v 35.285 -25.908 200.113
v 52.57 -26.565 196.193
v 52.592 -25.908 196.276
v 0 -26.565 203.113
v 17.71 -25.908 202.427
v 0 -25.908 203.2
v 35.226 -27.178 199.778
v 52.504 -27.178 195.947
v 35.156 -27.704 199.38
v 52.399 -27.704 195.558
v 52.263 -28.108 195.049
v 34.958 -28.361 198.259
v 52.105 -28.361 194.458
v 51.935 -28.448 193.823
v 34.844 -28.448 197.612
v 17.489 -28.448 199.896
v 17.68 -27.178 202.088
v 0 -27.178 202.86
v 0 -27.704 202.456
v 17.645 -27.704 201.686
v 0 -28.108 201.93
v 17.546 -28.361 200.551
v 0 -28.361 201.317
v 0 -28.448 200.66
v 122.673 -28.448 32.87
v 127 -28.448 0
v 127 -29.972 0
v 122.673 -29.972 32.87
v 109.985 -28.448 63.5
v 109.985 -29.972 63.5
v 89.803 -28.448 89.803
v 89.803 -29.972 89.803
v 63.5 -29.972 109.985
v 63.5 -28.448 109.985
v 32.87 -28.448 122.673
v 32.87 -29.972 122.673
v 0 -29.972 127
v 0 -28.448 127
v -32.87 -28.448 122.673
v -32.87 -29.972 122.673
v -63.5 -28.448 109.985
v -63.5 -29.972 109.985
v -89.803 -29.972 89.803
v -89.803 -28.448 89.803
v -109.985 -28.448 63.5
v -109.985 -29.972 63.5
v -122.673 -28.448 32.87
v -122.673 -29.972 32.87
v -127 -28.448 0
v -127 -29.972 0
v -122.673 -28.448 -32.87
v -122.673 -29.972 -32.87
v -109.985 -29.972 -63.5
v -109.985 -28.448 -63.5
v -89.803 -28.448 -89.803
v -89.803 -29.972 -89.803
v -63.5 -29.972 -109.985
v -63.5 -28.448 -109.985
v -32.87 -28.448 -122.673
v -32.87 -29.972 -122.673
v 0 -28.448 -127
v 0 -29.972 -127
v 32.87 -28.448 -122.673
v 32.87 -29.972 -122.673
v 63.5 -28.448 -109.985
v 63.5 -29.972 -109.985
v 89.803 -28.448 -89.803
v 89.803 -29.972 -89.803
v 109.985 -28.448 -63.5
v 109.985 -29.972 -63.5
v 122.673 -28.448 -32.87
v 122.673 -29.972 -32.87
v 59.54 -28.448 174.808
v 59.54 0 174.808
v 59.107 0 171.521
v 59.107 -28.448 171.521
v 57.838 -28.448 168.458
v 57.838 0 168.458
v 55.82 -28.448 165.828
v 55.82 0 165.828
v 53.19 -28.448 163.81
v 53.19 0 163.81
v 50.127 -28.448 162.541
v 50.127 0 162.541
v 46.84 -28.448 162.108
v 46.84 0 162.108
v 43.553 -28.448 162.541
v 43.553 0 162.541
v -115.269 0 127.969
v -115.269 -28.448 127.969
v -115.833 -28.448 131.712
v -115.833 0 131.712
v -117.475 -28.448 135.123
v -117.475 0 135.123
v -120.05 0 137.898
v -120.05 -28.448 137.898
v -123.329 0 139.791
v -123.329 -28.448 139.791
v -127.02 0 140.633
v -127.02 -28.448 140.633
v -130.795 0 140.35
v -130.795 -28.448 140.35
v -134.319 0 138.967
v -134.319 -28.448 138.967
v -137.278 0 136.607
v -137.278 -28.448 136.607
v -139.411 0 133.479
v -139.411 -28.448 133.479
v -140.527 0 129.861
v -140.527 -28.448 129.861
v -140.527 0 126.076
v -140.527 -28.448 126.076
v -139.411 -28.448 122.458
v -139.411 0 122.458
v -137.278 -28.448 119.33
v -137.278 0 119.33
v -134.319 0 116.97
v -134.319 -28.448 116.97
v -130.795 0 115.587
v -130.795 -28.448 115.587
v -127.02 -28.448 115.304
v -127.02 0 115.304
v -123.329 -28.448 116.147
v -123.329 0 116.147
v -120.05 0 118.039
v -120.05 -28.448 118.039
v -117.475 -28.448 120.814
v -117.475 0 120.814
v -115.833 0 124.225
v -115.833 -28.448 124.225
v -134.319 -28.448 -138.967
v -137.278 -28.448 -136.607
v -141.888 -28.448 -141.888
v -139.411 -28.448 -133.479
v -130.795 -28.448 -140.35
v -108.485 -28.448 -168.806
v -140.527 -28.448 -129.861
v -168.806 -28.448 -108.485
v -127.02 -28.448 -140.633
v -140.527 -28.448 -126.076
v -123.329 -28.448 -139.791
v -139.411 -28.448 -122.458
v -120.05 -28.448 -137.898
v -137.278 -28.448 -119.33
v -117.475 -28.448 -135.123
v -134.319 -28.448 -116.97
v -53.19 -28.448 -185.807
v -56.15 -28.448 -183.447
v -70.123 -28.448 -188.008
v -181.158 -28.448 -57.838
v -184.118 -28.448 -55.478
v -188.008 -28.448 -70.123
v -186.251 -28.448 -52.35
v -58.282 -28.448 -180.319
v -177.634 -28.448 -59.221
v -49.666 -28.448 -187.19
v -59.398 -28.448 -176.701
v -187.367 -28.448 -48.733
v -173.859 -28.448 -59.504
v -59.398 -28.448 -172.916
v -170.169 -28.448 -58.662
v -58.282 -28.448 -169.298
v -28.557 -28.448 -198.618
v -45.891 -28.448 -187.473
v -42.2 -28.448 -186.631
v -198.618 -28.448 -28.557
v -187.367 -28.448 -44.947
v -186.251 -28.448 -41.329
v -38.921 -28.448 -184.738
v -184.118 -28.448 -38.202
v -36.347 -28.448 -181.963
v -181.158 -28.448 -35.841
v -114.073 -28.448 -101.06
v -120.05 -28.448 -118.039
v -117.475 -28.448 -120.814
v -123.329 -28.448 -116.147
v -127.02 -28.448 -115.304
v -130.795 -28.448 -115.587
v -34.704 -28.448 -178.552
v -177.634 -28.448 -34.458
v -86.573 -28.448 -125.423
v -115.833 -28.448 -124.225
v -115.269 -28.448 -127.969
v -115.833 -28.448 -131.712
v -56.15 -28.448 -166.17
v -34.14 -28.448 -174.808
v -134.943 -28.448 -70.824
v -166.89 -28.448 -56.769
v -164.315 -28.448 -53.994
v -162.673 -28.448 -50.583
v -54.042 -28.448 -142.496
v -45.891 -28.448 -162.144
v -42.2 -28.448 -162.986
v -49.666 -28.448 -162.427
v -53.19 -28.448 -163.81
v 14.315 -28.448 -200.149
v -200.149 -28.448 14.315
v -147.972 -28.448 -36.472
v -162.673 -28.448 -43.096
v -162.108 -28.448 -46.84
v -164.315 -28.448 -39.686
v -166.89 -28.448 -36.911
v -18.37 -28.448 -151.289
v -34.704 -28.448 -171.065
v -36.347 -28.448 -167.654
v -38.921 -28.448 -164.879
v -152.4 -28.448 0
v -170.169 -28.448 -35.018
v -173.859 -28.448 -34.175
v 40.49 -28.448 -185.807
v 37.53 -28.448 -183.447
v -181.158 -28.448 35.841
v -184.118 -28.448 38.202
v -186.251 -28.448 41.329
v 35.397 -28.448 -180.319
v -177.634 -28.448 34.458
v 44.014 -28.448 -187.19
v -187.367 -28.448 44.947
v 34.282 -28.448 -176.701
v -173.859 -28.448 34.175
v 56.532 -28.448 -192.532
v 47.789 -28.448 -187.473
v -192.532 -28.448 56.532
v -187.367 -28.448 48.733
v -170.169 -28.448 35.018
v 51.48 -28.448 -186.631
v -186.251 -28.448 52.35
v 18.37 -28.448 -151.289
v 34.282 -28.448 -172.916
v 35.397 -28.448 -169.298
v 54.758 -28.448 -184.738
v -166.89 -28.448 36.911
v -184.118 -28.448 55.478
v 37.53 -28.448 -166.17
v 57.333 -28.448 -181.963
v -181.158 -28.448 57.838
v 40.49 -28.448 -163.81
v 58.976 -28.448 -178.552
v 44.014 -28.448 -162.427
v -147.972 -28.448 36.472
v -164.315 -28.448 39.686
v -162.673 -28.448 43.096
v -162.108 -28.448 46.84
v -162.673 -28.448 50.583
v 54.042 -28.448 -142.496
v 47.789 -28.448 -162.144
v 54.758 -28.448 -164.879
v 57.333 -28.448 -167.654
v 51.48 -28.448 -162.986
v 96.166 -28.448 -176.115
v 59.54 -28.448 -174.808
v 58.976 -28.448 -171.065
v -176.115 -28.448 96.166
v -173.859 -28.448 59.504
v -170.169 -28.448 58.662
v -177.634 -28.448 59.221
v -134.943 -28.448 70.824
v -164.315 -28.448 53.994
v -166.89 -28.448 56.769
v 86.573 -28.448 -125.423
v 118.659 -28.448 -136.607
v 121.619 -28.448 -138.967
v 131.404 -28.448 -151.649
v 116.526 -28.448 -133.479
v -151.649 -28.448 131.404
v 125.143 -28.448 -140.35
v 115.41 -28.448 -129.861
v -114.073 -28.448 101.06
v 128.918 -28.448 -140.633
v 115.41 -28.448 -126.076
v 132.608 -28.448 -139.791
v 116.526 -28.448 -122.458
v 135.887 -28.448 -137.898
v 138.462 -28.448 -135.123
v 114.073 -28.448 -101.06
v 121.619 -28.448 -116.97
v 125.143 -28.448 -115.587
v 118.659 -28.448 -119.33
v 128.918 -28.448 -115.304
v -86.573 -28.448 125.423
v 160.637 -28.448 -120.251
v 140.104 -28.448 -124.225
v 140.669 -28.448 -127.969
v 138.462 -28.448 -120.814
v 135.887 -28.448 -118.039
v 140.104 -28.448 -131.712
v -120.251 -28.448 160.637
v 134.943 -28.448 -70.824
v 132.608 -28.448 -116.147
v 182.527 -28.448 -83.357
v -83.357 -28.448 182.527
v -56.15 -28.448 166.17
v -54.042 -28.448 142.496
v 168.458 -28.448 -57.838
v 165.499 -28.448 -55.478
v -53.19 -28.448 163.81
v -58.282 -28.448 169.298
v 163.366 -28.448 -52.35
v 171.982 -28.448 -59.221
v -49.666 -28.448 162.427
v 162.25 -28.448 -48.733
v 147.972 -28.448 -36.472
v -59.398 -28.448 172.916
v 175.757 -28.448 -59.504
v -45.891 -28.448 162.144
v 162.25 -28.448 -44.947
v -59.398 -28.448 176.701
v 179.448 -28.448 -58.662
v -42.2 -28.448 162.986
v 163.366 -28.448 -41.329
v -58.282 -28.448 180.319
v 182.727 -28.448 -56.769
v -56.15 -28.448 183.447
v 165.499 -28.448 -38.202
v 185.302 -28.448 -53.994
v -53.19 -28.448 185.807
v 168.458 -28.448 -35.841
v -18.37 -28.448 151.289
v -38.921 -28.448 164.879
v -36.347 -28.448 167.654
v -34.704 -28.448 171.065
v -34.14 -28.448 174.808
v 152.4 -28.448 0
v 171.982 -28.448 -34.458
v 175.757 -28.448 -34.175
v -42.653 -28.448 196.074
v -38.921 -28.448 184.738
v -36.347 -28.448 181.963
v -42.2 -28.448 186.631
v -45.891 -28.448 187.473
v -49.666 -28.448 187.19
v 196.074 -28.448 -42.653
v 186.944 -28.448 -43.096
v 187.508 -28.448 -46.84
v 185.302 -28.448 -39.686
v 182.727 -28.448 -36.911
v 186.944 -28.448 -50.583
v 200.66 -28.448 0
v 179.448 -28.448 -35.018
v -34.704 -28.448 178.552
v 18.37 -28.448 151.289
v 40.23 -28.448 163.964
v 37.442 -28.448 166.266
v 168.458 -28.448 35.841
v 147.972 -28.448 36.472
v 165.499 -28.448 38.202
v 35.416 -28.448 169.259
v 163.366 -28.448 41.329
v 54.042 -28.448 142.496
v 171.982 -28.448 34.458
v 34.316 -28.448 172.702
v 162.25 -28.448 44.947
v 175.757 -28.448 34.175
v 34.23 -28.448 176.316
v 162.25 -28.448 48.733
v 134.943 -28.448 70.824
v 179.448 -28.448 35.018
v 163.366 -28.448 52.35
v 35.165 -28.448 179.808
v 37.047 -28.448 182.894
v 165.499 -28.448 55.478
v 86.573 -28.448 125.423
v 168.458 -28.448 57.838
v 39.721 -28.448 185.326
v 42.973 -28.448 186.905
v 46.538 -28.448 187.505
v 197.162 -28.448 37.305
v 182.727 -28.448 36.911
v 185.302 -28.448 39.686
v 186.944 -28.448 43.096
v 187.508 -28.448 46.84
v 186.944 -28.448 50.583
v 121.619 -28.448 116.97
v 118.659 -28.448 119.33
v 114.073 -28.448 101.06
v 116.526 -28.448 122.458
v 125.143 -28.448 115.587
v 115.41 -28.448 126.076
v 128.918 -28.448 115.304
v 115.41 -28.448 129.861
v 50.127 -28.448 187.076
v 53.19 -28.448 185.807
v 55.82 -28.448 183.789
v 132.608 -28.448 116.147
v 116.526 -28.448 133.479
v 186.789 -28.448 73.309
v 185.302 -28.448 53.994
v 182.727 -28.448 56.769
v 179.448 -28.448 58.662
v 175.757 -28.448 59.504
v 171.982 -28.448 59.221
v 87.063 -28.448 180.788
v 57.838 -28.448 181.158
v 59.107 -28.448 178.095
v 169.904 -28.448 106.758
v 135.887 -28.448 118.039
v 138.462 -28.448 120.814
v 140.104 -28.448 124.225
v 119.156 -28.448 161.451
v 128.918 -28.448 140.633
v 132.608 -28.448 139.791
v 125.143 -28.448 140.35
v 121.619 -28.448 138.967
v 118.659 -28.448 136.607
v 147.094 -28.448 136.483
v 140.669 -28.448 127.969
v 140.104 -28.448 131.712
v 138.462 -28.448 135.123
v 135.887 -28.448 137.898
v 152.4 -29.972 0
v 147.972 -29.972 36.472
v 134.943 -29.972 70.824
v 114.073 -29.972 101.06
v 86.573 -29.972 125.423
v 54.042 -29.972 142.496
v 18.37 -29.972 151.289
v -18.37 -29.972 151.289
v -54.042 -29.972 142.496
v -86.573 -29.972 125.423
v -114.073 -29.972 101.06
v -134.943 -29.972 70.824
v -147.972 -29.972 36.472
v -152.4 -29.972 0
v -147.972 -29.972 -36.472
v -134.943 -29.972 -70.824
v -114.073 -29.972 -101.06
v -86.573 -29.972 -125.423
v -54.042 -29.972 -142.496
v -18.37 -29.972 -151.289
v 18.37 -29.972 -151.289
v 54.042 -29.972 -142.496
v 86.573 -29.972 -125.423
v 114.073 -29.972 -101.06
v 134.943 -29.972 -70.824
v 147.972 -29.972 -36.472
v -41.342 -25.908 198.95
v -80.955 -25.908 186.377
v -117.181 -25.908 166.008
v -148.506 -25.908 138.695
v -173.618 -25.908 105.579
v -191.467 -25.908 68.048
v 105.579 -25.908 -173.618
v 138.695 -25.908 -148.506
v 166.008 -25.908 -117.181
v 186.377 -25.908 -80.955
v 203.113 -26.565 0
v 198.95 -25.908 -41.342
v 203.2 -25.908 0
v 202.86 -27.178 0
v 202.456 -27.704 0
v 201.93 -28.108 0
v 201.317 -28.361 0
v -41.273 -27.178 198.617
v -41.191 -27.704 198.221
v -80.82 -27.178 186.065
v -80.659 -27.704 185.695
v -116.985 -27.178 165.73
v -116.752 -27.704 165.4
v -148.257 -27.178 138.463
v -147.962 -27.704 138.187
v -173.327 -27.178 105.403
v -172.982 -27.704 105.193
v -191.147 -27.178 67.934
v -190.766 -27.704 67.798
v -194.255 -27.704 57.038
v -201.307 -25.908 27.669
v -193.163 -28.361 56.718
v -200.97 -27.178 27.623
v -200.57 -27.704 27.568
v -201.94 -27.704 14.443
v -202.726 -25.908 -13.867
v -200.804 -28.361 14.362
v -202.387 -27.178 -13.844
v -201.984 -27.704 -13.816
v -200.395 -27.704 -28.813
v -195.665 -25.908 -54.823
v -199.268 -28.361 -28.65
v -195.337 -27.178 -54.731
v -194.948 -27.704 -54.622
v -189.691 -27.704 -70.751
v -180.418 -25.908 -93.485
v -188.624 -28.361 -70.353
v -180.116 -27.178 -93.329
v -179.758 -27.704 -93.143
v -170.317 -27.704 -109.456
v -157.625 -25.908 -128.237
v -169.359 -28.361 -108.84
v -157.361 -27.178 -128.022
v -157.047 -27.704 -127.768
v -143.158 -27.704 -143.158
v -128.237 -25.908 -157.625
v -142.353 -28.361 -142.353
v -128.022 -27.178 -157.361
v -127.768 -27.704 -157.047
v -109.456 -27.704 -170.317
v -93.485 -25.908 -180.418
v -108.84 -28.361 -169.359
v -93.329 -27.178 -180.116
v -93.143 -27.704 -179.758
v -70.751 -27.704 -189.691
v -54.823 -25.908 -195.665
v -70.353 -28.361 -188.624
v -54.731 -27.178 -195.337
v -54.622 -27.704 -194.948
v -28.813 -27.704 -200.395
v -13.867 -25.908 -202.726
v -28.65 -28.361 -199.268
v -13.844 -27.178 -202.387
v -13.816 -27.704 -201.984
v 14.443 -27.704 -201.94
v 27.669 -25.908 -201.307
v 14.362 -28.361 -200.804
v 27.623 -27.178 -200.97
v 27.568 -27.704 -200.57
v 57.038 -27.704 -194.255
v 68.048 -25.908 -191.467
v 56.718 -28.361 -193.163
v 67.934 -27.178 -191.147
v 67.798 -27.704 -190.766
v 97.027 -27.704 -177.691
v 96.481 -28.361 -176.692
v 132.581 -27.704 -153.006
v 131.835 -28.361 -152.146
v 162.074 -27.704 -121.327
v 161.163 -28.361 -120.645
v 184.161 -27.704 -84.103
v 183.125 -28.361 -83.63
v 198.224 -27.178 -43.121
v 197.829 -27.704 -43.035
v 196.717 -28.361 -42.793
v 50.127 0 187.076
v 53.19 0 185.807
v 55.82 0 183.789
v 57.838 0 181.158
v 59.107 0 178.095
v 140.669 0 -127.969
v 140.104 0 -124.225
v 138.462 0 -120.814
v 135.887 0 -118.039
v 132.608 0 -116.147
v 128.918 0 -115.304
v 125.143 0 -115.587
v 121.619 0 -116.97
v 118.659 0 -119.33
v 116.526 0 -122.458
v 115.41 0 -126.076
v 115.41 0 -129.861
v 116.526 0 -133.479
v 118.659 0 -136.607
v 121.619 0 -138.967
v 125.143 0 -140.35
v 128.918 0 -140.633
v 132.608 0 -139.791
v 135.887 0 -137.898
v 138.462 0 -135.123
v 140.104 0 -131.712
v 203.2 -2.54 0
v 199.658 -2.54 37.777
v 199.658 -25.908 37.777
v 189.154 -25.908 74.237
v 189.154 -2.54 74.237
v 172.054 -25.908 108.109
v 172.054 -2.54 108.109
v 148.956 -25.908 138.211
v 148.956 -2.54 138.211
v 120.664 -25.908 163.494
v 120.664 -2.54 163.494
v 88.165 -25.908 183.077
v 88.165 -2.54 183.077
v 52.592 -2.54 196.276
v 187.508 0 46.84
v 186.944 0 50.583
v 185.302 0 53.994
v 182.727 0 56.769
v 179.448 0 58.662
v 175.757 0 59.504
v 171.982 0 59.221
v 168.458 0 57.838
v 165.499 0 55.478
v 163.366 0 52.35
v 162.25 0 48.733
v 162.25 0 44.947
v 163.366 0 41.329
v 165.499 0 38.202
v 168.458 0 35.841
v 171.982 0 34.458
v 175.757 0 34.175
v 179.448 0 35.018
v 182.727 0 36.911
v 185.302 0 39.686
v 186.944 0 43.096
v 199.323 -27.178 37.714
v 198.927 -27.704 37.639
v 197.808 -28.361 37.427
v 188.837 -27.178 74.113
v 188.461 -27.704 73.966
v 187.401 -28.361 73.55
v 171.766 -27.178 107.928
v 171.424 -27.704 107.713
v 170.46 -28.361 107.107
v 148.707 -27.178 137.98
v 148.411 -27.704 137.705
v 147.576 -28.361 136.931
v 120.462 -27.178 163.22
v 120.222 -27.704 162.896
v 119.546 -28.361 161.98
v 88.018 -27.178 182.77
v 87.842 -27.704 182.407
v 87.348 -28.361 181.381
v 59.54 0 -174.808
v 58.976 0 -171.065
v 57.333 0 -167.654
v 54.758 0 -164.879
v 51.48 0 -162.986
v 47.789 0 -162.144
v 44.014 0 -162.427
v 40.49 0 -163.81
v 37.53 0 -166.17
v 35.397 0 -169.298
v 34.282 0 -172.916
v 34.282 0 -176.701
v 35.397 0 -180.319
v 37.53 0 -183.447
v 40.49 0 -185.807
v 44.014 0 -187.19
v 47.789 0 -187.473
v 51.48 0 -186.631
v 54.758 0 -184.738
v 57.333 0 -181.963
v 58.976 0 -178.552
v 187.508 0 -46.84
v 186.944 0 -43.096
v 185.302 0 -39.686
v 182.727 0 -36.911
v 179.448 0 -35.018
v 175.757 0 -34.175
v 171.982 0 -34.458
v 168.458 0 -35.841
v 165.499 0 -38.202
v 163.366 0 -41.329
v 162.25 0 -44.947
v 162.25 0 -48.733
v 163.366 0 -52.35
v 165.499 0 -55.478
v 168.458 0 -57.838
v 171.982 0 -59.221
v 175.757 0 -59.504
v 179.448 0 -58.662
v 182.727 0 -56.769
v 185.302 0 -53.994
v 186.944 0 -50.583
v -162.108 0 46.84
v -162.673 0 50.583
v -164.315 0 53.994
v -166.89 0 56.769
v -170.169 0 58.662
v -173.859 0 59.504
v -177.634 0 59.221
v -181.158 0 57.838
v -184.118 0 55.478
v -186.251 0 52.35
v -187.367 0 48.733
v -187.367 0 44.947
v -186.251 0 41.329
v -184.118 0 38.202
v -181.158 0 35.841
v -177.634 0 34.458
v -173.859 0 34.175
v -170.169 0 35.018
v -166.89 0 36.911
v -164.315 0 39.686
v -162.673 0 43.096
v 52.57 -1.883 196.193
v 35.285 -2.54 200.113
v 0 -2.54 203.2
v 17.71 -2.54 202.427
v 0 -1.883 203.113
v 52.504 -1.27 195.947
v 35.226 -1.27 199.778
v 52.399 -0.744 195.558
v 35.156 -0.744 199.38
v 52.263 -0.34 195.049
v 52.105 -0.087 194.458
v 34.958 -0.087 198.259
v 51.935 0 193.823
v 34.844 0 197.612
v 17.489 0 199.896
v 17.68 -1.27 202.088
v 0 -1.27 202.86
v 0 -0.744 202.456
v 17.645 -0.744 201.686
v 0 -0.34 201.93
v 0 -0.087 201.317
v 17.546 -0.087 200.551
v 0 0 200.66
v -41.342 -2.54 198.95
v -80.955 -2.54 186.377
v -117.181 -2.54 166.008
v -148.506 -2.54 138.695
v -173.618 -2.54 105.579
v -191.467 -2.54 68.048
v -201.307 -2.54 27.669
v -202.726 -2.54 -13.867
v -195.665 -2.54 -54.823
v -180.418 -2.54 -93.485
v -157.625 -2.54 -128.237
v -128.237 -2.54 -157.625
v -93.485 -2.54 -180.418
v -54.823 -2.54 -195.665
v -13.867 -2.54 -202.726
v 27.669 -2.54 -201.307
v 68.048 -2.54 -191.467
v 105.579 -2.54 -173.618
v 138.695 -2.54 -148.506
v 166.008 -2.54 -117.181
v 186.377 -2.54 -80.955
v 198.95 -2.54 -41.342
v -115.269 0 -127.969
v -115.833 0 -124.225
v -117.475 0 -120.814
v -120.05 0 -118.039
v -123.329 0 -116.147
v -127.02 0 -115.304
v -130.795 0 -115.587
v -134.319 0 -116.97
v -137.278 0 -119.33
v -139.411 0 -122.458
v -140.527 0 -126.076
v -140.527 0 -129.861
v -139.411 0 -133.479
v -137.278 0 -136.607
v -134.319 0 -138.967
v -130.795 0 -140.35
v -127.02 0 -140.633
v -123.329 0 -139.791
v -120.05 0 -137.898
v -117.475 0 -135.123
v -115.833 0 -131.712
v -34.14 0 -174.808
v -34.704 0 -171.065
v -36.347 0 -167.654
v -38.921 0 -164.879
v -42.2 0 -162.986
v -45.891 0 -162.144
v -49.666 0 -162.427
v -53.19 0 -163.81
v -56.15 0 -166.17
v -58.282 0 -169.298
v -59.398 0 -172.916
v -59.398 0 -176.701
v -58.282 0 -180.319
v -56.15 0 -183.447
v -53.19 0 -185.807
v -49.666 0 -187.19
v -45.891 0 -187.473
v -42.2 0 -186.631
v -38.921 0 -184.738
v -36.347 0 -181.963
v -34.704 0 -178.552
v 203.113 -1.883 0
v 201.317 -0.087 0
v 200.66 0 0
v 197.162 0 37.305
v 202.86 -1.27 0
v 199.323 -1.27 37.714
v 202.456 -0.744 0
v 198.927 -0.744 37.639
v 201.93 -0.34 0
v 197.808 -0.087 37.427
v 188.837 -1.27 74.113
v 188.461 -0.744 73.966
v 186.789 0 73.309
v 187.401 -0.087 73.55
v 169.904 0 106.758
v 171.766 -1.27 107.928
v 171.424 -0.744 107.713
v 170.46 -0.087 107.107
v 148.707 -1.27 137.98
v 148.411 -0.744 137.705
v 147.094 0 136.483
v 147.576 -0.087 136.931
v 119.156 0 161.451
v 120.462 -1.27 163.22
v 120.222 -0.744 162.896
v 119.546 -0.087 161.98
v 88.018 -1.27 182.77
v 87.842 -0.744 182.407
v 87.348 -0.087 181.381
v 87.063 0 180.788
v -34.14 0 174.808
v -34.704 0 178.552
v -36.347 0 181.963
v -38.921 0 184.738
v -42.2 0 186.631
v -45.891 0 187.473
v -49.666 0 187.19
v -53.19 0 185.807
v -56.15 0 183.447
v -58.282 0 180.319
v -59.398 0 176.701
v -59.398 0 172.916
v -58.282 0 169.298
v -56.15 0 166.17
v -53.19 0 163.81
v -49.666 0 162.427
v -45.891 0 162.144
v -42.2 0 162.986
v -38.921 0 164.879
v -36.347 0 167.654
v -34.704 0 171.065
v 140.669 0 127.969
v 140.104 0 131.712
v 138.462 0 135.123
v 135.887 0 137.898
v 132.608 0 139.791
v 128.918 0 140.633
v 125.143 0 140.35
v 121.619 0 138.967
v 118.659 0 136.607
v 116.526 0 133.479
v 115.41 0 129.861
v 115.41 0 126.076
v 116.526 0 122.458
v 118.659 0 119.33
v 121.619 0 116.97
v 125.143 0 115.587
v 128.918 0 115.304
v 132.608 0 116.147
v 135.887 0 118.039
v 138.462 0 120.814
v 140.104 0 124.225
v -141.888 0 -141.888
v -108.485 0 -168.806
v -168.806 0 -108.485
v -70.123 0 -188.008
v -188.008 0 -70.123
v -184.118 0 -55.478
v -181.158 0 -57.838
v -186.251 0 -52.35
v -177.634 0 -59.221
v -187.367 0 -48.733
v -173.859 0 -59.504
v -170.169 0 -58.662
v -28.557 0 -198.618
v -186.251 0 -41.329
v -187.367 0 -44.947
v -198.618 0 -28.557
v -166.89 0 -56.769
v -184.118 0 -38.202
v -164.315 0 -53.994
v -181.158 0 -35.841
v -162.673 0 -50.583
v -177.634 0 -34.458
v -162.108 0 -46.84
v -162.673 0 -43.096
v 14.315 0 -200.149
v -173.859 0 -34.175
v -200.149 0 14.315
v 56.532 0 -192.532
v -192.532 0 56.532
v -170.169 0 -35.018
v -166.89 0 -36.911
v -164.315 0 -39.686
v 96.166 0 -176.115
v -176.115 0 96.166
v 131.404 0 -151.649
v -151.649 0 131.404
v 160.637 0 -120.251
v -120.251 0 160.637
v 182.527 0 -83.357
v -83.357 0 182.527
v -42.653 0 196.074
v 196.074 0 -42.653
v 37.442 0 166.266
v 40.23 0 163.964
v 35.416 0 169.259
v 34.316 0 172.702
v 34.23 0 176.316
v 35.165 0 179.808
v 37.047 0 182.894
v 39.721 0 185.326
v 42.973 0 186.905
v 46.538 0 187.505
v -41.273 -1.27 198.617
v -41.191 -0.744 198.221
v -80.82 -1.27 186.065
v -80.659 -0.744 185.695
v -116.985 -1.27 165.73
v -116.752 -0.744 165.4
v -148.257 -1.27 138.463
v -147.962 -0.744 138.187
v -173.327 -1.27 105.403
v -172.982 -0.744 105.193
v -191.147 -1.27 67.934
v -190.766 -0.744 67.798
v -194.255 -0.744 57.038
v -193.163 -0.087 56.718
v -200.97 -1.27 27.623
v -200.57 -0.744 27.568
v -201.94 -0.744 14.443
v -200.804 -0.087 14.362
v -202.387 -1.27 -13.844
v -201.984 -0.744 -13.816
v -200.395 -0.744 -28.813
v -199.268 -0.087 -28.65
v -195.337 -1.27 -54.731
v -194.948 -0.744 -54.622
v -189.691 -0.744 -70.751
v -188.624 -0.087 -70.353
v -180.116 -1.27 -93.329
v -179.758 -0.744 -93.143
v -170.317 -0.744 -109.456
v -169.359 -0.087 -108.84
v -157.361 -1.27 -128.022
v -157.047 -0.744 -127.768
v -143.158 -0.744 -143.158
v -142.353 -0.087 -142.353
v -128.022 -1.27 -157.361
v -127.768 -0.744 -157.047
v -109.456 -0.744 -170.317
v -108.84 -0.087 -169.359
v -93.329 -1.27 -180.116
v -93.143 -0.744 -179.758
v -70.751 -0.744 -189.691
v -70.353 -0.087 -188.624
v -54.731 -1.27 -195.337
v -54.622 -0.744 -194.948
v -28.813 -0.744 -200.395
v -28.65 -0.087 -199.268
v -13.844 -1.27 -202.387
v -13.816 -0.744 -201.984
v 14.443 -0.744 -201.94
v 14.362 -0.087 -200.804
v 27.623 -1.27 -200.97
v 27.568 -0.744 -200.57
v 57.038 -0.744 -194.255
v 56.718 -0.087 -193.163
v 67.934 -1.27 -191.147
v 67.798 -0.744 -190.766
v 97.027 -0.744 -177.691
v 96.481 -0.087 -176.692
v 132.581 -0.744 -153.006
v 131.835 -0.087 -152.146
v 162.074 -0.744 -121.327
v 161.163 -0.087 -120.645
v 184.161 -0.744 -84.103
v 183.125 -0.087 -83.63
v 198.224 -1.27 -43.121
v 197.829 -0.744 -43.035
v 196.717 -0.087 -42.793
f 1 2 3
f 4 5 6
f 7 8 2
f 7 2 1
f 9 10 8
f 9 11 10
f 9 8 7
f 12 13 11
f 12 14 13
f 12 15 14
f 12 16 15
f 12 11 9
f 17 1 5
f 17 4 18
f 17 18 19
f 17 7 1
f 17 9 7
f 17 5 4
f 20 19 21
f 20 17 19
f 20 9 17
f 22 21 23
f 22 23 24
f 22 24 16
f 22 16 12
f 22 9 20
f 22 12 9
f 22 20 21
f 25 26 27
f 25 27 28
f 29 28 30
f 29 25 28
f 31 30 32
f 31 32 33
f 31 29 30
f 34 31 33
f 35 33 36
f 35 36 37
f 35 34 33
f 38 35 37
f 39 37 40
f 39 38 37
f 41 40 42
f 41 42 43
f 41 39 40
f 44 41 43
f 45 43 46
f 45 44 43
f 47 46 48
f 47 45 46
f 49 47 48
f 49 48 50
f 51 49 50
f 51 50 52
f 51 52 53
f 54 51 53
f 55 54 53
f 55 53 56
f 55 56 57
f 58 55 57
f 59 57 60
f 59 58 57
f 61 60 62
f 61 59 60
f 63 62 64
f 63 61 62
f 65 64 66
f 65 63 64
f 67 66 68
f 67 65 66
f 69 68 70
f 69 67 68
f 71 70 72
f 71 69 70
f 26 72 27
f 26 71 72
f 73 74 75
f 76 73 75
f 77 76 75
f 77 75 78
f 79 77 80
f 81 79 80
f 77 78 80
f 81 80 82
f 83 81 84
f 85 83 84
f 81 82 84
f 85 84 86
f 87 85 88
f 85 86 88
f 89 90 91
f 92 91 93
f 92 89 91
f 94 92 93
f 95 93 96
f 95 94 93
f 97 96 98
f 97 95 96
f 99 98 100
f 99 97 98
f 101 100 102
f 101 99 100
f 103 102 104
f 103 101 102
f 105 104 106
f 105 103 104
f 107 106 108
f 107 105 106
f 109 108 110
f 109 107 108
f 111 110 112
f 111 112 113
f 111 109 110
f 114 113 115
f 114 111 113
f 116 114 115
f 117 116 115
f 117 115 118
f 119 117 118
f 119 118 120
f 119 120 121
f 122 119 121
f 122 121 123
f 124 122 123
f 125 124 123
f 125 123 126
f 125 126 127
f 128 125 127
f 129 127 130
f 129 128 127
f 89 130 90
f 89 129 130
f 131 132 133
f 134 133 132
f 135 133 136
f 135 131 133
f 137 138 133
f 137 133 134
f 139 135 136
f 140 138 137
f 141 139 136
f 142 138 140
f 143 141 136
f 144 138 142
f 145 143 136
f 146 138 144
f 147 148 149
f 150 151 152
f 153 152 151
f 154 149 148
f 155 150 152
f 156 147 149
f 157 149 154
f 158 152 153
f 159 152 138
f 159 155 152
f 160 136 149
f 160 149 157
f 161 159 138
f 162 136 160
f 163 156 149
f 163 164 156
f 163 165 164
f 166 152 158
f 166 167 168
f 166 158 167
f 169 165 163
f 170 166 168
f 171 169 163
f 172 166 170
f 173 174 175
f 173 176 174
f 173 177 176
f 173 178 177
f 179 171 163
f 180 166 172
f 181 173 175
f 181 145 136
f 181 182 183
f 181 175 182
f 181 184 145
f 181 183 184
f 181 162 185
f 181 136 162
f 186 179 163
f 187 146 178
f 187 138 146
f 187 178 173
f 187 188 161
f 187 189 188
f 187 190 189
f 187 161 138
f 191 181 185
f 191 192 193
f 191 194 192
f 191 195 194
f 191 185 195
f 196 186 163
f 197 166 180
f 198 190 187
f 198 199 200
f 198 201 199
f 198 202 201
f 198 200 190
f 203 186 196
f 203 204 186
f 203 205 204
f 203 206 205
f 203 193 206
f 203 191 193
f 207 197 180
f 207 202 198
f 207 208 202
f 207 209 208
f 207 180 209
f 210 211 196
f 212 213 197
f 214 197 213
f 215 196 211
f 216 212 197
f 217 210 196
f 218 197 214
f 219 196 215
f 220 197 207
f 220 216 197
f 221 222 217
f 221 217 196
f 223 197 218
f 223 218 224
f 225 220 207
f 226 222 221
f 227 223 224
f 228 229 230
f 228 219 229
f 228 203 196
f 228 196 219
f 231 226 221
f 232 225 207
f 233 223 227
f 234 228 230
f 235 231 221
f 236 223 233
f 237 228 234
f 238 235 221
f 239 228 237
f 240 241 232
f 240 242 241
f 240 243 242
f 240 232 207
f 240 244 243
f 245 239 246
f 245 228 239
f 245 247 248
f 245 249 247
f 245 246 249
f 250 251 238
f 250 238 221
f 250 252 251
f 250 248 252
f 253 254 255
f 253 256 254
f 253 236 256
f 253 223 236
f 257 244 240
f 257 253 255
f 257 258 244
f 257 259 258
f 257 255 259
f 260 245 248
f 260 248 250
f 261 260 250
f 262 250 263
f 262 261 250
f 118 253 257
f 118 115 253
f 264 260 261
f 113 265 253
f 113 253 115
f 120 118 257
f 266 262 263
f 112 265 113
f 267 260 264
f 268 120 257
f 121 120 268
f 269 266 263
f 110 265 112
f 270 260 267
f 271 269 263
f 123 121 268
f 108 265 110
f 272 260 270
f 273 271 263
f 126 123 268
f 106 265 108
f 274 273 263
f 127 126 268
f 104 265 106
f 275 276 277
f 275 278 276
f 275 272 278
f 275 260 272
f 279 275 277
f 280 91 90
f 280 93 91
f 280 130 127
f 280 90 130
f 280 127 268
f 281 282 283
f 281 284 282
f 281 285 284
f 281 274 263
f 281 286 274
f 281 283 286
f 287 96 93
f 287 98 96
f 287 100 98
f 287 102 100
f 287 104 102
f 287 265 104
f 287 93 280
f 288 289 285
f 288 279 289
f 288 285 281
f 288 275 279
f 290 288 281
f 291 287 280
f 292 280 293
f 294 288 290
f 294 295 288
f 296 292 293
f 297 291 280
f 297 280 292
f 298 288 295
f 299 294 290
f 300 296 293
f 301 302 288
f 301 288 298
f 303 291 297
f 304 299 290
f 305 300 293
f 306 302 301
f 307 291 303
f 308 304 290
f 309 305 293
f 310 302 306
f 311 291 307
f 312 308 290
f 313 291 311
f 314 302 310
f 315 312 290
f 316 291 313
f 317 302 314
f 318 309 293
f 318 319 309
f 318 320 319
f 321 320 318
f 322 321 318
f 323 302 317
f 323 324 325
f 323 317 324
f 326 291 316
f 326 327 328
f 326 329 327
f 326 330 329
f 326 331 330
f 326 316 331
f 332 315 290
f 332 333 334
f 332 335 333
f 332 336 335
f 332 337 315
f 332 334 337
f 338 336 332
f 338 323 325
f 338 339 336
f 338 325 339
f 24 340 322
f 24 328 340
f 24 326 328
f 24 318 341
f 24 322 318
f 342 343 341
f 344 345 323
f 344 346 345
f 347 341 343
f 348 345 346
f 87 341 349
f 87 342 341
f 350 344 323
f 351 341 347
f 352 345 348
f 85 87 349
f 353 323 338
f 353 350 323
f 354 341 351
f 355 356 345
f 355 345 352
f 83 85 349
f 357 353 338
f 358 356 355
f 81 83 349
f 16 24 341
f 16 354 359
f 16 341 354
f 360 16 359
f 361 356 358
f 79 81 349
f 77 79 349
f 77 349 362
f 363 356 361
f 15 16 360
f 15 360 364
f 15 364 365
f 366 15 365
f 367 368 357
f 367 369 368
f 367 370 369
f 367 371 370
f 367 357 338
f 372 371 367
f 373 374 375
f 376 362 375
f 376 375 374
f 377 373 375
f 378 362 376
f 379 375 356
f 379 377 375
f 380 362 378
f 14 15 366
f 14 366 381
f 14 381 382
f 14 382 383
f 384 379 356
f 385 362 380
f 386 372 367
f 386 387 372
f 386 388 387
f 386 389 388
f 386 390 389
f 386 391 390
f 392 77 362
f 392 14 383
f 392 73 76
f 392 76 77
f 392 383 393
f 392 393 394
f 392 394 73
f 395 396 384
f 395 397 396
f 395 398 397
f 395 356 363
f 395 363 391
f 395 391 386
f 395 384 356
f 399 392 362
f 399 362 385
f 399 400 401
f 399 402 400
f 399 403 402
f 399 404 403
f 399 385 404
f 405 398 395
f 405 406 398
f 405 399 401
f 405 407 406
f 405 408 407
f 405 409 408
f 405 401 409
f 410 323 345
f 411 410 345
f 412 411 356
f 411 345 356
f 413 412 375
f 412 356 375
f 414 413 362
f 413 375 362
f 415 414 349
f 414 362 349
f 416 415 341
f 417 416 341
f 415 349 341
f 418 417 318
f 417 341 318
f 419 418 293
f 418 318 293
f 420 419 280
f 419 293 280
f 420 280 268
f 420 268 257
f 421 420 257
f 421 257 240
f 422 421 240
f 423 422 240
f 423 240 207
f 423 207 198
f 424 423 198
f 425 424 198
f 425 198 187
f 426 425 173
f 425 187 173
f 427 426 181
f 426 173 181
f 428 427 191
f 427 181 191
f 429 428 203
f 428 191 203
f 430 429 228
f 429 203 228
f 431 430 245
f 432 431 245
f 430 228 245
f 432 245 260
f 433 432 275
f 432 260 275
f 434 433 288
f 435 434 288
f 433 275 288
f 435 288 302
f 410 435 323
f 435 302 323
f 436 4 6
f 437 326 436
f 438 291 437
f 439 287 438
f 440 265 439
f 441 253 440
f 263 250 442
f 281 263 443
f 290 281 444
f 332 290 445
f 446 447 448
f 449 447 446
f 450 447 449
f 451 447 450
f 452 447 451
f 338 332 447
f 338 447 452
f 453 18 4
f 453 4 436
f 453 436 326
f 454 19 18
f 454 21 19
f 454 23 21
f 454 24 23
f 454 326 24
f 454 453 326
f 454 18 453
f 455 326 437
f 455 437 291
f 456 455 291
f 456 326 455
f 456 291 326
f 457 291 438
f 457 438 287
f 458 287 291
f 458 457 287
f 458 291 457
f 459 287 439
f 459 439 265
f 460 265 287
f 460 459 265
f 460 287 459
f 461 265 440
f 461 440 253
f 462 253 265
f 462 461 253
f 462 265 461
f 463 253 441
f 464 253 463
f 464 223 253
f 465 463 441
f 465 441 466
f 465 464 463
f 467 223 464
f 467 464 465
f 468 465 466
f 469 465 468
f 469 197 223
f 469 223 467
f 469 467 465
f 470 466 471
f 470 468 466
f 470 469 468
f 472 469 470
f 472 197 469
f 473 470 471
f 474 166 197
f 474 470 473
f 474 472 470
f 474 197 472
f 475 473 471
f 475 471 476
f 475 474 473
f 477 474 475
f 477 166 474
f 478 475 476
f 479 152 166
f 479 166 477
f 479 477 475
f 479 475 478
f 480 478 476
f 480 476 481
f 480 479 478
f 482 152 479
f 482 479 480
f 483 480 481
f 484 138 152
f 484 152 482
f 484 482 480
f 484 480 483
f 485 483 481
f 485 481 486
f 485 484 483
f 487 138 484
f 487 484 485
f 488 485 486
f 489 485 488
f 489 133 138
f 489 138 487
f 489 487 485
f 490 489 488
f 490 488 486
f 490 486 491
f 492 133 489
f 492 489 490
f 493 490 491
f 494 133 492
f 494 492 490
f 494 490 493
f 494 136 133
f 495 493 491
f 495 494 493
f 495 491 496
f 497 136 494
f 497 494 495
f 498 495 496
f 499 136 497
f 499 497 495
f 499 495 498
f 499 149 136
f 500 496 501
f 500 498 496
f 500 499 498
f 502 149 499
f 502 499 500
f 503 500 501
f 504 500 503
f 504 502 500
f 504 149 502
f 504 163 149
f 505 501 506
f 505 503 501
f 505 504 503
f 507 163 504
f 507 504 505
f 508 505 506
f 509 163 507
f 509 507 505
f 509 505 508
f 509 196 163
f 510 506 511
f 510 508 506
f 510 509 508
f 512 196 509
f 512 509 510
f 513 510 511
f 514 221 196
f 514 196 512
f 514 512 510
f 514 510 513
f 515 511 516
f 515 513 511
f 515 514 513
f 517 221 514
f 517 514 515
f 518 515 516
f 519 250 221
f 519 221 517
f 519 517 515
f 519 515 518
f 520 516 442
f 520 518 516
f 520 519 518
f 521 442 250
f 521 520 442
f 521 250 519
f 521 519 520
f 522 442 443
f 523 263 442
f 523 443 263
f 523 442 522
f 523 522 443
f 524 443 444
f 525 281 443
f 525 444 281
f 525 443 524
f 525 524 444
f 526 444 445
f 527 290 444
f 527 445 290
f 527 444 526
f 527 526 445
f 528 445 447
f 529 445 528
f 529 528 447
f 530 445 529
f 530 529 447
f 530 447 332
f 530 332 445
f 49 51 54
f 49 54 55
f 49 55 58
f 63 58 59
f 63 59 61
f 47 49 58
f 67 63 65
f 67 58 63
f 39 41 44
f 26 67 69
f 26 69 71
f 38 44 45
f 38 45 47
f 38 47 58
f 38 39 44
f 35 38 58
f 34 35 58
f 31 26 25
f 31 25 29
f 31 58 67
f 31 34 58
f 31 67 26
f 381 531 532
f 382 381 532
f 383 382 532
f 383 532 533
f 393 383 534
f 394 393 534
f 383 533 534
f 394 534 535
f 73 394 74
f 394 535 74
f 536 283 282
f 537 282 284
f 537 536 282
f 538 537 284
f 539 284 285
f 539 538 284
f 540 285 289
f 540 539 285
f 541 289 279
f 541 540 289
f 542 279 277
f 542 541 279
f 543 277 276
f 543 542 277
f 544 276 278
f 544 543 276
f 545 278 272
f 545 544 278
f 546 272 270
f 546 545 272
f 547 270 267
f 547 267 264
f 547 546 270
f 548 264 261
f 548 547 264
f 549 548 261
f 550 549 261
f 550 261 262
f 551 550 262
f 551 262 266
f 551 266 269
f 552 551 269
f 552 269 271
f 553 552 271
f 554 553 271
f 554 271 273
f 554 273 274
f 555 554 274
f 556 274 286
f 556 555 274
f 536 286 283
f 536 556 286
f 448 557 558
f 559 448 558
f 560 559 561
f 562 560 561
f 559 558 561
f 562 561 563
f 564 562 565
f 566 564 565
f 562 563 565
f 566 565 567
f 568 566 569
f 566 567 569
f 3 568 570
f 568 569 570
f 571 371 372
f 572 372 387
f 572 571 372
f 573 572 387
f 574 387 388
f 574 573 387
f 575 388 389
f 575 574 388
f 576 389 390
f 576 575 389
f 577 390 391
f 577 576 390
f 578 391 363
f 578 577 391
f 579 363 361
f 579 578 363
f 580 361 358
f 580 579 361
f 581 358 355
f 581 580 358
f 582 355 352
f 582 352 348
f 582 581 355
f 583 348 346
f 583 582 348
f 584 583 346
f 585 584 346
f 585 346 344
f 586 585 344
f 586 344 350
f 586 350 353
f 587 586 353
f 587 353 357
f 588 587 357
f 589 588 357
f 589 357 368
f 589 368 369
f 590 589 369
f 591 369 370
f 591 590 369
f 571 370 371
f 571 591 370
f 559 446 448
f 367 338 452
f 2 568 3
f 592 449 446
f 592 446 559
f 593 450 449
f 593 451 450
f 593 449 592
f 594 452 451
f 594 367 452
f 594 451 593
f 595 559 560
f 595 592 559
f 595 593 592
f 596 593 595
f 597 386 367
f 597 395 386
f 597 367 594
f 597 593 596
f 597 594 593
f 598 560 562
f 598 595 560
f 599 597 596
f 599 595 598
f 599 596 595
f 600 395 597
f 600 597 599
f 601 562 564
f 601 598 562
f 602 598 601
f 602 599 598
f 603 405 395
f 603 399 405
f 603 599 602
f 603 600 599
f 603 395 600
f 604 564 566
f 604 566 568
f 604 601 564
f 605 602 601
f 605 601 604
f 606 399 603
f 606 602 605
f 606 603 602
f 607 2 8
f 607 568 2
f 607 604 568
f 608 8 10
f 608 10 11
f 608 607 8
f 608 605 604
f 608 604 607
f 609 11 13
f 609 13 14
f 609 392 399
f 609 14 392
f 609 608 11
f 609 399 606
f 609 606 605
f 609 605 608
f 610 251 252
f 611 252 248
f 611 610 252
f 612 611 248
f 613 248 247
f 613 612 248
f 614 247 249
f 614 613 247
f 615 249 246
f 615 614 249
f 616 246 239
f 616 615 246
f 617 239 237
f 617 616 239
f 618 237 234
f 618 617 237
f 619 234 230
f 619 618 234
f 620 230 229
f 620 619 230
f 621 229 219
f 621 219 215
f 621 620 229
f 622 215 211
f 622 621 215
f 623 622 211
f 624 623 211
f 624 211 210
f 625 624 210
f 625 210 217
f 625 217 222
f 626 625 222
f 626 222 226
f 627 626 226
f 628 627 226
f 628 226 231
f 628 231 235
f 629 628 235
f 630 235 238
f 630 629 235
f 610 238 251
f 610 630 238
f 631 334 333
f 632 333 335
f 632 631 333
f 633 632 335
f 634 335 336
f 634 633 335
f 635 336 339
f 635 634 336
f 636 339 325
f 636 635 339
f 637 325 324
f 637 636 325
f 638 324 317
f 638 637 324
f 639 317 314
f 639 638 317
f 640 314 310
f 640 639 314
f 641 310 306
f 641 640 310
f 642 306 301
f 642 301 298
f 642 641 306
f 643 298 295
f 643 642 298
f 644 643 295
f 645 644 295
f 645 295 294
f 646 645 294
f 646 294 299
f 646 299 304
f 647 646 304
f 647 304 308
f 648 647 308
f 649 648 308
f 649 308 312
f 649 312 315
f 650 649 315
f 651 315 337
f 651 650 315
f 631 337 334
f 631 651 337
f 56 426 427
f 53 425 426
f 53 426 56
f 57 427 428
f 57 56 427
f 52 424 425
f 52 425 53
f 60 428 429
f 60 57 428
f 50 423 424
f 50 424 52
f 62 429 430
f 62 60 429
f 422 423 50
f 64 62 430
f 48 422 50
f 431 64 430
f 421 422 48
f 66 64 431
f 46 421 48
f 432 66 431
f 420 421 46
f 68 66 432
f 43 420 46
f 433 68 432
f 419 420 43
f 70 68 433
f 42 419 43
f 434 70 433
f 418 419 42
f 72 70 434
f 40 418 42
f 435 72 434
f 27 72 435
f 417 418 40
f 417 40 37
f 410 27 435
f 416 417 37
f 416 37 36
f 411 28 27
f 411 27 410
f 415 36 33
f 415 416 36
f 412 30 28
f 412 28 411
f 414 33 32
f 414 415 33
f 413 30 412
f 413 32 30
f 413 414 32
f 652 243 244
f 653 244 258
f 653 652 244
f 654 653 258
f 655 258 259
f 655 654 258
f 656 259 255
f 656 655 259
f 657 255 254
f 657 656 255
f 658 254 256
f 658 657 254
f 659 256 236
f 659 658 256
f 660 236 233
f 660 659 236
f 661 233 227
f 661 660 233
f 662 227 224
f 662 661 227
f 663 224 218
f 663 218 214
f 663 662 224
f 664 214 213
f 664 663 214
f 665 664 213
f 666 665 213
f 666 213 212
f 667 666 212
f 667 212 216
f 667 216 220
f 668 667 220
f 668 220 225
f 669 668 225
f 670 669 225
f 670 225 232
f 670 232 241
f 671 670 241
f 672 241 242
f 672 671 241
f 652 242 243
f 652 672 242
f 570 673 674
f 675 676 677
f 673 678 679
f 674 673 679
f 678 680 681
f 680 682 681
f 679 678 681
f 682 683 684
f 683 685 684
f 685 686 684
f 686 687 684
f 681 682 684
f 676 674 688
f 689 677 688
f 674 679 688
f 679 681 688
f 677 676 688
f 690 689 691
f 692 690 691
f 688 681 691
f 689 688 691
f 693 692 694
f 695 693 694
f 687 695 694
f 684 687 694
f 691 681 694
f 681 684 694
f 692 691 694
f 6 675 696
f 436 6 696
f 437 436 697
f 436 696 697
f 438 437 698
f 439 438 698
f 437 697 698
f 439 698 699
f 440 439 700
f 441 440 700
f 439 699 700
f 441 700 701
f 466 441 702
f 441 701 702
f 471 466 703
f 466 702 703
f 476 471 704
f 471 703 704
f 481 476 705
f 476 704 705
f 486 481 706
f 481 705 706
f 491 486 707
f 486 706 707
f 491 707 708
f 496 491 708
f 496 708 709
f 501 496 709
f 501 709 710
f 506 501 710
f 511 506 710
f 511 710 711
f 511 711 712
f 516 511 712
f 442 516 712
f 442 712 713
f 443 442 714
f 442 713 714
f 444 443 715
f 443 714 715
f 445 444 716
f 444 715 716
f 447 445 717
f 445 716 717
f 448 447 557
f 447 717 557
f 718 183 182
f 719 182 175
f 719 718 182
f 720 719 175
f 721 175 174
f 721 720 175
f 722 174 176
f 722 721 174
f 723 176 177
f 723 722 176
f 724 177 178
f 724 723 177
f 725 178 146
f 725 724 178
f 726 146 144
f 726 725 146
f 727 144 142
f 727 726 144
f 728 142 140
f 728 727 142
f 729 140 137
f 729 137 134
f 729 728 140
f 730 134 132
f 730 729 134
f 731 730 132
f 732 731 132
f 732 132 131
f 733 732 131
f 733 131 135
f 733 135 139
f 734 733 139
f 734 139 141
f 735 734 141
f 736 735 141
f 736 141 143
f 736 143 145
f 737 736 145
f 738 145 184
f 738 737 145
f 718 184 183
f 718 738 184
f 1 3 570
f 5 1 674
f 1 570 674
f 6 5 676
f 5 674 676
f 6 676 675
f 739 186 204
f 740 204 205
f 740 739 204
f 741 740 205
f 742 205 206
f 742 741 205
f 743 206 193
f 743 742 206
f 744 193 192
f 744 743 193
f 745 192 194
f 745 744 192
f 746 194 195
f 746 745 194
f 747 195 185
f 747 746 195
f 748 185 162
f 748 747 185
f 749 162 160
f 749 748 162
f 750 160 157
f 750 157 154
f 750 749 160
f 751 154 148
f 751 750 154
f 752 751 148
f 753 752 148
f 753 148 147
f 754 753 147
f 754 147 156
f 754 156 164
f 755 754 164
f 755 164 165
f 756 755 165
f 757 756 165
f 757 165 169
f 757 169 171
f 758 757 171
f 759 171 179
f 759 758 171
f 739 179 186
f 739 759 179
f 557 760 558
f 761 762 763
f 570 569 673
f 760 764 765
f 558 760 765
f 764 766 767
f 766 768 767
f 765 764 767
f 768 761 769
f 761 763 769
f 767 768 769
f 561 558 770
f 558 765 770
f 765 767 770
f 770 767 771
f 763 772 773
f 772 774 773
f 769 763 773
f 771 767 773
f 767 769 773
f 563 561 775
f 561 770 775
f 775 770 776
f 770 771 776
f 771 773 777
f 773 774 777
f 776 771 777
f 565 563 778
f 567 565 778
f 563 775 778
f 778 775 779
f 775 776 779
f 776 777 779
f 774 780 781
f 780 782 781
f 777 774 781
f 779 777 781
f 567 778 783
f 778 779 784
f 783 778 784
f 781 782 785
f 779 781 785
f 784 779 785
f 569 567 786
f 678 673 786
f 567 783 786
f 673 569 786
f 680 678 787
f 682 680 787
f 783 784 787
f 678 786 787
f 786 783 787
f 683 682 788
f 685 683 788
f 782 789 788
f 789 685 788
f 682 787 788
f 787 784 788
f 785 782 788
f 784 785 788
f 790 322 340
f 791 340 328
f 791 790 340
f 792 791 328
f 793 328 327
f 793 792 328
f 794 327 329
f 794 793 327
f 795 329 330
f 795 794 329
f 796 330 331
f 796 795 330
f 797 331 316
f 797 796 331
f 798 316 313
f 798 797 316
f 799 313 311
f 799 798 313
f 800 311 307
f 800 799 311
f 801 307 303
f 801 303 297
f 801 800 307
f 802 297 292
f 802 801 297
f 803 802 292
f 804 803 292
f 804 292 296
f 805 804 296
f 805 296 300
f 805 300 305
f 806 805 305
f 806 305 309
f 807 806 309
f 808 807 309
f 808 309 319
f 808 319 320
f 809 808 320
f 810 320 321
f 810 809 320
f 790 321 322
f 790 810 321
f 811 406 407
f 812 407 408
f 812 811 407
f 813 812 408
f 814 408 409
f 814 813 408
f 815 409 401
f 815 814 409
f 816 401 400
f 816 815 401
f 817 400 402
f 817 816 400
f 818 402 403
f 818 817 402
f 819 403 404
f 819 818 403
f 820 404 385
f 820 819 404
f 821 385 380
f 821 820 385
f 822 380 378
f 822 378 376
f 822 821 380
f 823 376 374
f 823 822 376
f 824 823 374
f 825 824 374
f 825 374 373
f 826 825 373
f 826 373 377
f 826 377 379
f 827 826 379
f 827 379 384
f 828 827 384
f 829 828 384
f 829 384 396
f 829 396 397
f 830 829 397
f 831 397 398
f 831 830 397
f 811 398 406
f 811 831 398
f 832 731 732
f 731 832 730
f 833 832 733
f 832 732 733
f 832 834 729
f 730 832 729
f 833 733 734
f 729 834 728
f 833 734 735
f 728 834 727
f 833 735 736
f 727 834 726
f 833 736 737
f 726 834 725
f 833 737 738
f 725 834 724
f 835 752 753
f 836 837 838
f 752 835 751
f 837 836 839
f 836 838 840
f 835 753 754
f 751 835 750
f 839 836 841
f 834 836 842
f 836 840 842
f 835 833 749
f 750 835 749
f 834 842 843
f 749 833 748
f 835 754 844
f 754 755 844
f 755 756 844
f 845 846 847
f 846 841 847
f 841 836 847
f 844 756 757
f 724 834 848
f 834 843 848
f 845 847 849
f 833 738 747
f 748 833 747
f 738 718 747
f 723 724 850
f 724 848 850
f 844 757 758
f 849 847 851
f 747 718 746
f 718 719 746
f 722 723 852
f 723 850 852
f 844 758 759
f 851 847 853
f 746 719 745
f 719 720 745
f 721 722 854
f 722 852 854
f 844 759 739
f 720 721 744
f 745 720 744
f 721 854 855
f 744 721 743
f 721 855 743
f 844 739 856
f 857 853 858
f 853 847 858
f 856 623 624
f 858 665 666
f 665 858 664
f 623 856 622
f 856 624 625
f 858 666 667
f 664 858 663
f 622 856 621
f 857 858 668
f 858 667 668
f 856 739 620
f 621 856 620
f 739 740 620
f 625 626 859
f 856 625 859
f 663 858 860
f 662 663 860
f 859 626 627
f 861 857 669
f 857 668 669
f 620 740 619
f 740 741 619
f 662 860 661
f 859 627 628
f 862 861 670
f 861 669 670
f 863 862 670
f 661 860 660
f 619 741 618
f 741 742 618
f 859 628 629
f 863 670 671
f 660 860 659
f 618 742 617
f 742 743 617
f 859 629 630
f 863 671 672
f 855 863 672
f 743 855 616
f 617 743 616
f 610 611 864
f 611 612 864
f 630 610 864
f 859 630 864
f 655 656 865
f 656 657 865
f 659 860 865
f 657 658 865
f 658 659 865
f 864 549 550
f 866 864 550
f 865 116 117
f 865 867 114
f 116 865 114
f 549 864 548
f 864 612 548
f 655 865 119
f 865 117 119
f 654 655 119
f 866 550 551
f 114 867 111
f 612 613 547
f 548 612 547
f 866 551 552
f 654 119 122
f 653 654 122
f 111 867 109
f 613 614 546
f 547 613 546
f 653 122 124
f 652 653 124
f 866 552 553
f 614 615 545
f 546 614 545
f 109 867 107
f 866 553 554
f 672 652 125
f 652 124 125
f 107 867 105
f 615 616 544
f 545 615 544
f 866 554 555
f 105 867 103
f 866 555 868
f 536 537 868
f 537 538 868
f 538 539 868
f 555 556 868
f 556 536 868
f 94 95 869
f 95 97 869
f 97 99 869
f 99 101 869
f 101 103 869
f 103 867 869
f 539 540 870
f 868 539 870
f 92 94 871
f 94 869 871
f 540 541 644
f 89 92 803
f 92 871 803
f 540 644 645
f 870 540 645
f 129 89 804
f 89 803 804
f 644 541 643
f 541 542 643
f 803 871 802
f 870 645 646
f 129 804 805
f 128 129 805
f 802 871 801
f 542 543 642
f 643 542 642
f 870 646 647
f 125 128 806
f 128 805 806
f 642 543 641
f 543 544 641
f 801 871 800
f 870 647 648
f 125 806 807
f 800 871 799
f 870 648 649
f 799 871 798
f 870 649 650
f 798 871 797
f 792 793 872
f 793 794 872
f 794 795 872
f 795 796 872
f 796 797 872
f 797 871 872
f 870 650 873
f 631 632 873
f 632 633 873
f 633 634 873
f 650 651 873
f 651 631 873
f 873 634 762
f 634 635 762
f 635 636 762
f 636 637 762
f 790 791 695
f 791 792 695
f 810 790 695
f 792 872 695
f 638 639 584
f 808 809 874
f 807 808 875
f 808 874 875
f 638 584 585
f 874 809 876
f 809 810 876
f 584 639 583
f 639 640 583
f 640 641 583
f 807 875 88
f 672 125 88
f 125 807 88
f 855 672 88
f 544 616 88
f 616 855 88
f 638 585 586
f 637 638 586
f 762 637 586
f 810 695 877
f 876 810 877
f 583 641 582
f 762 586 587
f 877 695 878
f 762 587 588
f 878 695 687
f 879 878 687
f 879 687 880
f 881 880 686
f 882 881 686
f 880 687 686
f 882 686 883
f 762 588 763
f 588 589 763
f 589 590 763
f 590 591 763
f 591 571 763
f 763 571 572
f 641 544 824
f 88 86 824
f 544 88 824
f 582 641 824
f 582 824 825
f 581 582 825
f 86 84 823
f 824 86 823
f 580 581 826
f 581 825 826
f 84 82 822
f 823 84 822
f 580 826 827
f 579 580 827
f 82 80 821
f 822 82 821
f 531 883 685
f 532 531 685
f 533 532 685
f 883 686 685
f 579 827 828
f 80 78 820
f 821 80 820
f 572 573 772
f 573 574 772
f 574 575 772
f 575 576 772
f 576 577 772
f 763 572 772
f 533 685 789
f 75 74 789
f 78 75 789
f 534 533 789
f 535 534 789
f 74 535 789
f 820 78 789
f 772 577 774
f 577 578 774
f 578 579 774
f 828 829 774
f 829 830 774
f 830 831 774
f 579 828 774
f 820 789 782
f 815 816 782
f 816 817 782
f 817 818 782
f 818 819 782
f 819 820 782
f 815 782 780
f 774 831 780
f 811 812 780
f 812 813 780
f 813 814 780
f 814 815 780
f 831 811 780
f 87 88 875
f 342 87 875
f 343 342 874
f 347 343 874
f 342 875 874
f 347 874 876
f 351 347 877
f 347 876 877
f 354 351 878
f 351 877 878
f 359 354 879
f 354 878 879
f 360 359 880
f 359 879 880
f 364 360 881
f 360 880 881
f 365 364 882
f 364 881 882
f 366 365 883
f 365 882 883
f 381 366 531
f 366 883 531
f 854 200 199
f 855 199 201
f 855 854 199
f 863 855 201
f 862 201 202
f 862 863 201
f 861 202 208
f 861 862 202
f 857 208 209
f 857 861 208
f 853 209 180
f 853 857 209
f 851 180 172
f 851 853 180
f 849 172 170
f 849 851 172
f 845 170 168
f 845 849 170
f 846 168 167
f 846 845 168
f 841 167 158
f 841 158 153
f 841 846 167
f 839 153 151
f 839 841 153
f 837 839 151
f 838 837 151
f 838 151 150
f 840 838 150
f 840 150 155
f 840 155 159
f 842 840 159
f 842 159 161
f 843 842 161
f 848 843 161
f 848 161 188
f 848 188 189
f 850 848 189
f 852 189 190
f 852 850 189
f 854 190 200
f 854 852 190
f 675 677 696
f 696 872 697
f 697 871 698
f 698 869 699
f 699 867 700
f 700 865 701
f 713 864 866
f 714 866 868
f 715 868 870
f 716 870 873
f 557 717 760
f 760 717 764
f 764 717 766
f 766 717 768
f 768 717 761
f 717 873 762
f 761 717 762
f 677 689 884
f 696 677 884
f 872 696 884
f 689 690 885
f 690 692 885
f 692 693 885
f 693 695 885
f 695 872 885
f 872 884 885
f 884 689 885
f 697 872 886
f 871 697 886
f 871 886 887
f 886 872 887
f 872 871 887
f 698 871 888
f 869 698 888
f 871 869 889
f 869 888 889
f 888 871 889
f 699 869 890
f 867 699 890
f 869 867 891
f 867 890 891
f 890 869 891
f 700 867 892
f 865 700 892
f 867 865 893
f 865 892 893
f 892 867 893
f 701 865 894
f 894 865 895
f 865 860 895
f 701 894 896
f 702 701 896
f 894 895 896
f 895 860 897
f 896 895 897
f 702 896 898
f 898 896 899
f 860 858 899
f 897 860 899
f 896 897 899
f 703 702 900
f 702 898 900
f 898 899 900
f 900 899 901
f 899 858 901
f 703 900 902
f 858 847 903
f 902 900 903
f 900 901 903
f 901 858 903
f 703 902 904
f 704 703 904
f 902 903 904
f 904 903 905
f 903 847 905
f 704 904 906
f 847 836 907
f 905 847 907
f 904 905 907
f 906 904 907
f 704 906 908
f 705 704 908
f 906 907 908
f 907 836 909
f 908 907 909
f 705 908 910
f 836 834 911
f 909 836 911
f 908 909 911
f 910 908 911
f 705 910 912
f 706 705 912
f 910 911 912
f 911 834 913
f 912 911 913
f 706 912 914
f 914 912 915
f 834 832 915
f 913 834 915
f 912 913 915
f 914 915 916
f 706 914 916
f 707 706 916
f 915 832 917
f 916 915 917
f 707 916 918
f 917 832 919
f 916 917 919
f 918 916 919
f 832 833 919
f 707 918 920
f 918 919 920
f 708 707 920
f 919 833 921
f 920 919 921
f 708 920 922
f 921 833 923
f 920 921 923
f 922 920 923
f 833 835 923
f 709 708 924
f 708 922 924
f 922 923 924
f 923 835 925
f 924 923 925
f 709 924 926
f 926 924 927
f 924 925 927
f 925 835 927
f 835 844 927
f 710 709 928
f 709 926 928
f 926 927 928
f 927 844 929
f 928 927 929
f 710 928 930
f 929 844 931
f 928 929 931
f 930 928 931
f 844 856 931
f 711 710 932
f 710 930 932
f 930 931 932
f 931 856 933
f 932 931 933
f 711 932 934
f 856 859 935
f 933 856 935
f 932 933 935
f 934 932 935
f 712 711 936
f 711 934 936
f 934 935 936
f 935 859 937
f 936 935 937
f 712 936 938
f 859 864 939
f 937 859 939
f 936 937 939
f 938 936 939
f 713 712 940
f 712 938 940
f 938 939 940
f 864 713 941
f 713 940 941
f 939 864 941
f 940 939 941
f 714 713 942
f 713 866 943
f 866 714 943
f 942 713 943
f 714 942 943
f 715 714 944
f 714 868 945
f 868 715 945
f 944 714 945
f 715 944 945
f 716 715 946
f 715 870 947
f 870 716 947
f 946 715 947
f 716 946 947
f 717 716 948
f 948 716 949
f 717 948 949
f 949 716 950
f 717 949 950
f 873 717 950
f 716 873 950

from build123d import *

# Parameters (mm, degrees)
F0_R     = 12.7
F1_DEPTH = 28.448
F2_R     = 2.54
F3_R     = 152.4
F3_R_2   = 127
F4_DEPTH = 1.524


with BuildPart() as f1:
    # F0 (on Front) → F1 (new body)
    with BuildSketch(Plane.XZ):
        with BuildLine():
            ThreePointArc((0, 203.2), (-143.684098, -143.684098), (203.2, 0))
            ThreePointArc((203.2, 0), (161.209399, 123.700322), (52.59203, 196.276128))
            Line((52.59203, 196.276128), (50.126779, 187.075684))
            ThreePointArc((50.126779, 187.075684), (56.915364, 182.539697), (59.539777, 174.808426))
            ThreePointArc((59.539777, 174.808426), (54.571047, 164.732839), (43.552775, 162.541168))
            Line((43.552775, 162.541168), (0, 0))
            Line((0, 0), (0, 203.2))
        make_face()
        with Locations((-127.96865, -127.96865)):
            Circle(F0_R, mode=Mode.SUBTRACT)
        with Locations((-46.839777, -174.808426)):
            Circle(F0_R, mode=Mode.SUBTRACT)
        with Locations((-174.808426, -46.839777)):
            Circle(F0_R, mode=Mode.SUBTRACT)
        with Locations((46.839777, -174.808426)):
            Circle(F0_R, mode=Mode.SUBTRACT)
        with Locations((127.96865, -127.96865)):
            Circle(F0_R, mode=Mode.SUBTRACT)
        with Locations((174.808426, -46.839777)):
            Circle(F0_R, mode=Mode.SUBTRACT)
        with Locations((-174.808426, 46.839777)):
            Circle(F0_R, mode=Mode.SUBTRACT)
        with Locations((-127.96865, 127.96865)):
            Circle(F0_R, mode=Mode.SUBTRACT)
        with Locations((-46.839777, 174.808426)):
            Circle(F0_R, mode=Mode.SUBTRACT)
        with Locations((174.808426, 46.839777)):
            Circle(F0_R, mode=Mode.SUBTRACT)
        with Locations((127.96865, 127.96865)):
            Circle(F0_R, mode=Mode.SUBTRACT)
        with BuildLine():
            Line((50.126779, 187.075684), (52.59203, 196.276128))
            ThreePointArc((52.59203, 196.276128), (26.522922, 201.461596), (0, 203.2))
            Line((0, 203.2), (0, 0))
            Line((0, 0), (43.552775, 162.541168))
            ThreePointArc((43.552775, 162.541168), (34.572519, 178.095428), (50.126779, 187.075684))
        make_face()
    extrude(amount=F1_DEPTH)

    # F2
    f2_edges = [f1.edges().sort_by_distance(p)[0] for p in [
        (-203.2, -28.448, 0),
        (-203.2, 0, 0),
    ]]
    fillet(f2_edges, radius=F2_R)

    # F3 (on face) → F4 (join)
    with BuildSketch(Plane.XZ.offset(28.448)):
        Circle(F3_R)
        Circle(F3_R_2, mode=Mode.SUBTRACT)
    extrude(amount=F4_DEPTH)


solid = f1.part
